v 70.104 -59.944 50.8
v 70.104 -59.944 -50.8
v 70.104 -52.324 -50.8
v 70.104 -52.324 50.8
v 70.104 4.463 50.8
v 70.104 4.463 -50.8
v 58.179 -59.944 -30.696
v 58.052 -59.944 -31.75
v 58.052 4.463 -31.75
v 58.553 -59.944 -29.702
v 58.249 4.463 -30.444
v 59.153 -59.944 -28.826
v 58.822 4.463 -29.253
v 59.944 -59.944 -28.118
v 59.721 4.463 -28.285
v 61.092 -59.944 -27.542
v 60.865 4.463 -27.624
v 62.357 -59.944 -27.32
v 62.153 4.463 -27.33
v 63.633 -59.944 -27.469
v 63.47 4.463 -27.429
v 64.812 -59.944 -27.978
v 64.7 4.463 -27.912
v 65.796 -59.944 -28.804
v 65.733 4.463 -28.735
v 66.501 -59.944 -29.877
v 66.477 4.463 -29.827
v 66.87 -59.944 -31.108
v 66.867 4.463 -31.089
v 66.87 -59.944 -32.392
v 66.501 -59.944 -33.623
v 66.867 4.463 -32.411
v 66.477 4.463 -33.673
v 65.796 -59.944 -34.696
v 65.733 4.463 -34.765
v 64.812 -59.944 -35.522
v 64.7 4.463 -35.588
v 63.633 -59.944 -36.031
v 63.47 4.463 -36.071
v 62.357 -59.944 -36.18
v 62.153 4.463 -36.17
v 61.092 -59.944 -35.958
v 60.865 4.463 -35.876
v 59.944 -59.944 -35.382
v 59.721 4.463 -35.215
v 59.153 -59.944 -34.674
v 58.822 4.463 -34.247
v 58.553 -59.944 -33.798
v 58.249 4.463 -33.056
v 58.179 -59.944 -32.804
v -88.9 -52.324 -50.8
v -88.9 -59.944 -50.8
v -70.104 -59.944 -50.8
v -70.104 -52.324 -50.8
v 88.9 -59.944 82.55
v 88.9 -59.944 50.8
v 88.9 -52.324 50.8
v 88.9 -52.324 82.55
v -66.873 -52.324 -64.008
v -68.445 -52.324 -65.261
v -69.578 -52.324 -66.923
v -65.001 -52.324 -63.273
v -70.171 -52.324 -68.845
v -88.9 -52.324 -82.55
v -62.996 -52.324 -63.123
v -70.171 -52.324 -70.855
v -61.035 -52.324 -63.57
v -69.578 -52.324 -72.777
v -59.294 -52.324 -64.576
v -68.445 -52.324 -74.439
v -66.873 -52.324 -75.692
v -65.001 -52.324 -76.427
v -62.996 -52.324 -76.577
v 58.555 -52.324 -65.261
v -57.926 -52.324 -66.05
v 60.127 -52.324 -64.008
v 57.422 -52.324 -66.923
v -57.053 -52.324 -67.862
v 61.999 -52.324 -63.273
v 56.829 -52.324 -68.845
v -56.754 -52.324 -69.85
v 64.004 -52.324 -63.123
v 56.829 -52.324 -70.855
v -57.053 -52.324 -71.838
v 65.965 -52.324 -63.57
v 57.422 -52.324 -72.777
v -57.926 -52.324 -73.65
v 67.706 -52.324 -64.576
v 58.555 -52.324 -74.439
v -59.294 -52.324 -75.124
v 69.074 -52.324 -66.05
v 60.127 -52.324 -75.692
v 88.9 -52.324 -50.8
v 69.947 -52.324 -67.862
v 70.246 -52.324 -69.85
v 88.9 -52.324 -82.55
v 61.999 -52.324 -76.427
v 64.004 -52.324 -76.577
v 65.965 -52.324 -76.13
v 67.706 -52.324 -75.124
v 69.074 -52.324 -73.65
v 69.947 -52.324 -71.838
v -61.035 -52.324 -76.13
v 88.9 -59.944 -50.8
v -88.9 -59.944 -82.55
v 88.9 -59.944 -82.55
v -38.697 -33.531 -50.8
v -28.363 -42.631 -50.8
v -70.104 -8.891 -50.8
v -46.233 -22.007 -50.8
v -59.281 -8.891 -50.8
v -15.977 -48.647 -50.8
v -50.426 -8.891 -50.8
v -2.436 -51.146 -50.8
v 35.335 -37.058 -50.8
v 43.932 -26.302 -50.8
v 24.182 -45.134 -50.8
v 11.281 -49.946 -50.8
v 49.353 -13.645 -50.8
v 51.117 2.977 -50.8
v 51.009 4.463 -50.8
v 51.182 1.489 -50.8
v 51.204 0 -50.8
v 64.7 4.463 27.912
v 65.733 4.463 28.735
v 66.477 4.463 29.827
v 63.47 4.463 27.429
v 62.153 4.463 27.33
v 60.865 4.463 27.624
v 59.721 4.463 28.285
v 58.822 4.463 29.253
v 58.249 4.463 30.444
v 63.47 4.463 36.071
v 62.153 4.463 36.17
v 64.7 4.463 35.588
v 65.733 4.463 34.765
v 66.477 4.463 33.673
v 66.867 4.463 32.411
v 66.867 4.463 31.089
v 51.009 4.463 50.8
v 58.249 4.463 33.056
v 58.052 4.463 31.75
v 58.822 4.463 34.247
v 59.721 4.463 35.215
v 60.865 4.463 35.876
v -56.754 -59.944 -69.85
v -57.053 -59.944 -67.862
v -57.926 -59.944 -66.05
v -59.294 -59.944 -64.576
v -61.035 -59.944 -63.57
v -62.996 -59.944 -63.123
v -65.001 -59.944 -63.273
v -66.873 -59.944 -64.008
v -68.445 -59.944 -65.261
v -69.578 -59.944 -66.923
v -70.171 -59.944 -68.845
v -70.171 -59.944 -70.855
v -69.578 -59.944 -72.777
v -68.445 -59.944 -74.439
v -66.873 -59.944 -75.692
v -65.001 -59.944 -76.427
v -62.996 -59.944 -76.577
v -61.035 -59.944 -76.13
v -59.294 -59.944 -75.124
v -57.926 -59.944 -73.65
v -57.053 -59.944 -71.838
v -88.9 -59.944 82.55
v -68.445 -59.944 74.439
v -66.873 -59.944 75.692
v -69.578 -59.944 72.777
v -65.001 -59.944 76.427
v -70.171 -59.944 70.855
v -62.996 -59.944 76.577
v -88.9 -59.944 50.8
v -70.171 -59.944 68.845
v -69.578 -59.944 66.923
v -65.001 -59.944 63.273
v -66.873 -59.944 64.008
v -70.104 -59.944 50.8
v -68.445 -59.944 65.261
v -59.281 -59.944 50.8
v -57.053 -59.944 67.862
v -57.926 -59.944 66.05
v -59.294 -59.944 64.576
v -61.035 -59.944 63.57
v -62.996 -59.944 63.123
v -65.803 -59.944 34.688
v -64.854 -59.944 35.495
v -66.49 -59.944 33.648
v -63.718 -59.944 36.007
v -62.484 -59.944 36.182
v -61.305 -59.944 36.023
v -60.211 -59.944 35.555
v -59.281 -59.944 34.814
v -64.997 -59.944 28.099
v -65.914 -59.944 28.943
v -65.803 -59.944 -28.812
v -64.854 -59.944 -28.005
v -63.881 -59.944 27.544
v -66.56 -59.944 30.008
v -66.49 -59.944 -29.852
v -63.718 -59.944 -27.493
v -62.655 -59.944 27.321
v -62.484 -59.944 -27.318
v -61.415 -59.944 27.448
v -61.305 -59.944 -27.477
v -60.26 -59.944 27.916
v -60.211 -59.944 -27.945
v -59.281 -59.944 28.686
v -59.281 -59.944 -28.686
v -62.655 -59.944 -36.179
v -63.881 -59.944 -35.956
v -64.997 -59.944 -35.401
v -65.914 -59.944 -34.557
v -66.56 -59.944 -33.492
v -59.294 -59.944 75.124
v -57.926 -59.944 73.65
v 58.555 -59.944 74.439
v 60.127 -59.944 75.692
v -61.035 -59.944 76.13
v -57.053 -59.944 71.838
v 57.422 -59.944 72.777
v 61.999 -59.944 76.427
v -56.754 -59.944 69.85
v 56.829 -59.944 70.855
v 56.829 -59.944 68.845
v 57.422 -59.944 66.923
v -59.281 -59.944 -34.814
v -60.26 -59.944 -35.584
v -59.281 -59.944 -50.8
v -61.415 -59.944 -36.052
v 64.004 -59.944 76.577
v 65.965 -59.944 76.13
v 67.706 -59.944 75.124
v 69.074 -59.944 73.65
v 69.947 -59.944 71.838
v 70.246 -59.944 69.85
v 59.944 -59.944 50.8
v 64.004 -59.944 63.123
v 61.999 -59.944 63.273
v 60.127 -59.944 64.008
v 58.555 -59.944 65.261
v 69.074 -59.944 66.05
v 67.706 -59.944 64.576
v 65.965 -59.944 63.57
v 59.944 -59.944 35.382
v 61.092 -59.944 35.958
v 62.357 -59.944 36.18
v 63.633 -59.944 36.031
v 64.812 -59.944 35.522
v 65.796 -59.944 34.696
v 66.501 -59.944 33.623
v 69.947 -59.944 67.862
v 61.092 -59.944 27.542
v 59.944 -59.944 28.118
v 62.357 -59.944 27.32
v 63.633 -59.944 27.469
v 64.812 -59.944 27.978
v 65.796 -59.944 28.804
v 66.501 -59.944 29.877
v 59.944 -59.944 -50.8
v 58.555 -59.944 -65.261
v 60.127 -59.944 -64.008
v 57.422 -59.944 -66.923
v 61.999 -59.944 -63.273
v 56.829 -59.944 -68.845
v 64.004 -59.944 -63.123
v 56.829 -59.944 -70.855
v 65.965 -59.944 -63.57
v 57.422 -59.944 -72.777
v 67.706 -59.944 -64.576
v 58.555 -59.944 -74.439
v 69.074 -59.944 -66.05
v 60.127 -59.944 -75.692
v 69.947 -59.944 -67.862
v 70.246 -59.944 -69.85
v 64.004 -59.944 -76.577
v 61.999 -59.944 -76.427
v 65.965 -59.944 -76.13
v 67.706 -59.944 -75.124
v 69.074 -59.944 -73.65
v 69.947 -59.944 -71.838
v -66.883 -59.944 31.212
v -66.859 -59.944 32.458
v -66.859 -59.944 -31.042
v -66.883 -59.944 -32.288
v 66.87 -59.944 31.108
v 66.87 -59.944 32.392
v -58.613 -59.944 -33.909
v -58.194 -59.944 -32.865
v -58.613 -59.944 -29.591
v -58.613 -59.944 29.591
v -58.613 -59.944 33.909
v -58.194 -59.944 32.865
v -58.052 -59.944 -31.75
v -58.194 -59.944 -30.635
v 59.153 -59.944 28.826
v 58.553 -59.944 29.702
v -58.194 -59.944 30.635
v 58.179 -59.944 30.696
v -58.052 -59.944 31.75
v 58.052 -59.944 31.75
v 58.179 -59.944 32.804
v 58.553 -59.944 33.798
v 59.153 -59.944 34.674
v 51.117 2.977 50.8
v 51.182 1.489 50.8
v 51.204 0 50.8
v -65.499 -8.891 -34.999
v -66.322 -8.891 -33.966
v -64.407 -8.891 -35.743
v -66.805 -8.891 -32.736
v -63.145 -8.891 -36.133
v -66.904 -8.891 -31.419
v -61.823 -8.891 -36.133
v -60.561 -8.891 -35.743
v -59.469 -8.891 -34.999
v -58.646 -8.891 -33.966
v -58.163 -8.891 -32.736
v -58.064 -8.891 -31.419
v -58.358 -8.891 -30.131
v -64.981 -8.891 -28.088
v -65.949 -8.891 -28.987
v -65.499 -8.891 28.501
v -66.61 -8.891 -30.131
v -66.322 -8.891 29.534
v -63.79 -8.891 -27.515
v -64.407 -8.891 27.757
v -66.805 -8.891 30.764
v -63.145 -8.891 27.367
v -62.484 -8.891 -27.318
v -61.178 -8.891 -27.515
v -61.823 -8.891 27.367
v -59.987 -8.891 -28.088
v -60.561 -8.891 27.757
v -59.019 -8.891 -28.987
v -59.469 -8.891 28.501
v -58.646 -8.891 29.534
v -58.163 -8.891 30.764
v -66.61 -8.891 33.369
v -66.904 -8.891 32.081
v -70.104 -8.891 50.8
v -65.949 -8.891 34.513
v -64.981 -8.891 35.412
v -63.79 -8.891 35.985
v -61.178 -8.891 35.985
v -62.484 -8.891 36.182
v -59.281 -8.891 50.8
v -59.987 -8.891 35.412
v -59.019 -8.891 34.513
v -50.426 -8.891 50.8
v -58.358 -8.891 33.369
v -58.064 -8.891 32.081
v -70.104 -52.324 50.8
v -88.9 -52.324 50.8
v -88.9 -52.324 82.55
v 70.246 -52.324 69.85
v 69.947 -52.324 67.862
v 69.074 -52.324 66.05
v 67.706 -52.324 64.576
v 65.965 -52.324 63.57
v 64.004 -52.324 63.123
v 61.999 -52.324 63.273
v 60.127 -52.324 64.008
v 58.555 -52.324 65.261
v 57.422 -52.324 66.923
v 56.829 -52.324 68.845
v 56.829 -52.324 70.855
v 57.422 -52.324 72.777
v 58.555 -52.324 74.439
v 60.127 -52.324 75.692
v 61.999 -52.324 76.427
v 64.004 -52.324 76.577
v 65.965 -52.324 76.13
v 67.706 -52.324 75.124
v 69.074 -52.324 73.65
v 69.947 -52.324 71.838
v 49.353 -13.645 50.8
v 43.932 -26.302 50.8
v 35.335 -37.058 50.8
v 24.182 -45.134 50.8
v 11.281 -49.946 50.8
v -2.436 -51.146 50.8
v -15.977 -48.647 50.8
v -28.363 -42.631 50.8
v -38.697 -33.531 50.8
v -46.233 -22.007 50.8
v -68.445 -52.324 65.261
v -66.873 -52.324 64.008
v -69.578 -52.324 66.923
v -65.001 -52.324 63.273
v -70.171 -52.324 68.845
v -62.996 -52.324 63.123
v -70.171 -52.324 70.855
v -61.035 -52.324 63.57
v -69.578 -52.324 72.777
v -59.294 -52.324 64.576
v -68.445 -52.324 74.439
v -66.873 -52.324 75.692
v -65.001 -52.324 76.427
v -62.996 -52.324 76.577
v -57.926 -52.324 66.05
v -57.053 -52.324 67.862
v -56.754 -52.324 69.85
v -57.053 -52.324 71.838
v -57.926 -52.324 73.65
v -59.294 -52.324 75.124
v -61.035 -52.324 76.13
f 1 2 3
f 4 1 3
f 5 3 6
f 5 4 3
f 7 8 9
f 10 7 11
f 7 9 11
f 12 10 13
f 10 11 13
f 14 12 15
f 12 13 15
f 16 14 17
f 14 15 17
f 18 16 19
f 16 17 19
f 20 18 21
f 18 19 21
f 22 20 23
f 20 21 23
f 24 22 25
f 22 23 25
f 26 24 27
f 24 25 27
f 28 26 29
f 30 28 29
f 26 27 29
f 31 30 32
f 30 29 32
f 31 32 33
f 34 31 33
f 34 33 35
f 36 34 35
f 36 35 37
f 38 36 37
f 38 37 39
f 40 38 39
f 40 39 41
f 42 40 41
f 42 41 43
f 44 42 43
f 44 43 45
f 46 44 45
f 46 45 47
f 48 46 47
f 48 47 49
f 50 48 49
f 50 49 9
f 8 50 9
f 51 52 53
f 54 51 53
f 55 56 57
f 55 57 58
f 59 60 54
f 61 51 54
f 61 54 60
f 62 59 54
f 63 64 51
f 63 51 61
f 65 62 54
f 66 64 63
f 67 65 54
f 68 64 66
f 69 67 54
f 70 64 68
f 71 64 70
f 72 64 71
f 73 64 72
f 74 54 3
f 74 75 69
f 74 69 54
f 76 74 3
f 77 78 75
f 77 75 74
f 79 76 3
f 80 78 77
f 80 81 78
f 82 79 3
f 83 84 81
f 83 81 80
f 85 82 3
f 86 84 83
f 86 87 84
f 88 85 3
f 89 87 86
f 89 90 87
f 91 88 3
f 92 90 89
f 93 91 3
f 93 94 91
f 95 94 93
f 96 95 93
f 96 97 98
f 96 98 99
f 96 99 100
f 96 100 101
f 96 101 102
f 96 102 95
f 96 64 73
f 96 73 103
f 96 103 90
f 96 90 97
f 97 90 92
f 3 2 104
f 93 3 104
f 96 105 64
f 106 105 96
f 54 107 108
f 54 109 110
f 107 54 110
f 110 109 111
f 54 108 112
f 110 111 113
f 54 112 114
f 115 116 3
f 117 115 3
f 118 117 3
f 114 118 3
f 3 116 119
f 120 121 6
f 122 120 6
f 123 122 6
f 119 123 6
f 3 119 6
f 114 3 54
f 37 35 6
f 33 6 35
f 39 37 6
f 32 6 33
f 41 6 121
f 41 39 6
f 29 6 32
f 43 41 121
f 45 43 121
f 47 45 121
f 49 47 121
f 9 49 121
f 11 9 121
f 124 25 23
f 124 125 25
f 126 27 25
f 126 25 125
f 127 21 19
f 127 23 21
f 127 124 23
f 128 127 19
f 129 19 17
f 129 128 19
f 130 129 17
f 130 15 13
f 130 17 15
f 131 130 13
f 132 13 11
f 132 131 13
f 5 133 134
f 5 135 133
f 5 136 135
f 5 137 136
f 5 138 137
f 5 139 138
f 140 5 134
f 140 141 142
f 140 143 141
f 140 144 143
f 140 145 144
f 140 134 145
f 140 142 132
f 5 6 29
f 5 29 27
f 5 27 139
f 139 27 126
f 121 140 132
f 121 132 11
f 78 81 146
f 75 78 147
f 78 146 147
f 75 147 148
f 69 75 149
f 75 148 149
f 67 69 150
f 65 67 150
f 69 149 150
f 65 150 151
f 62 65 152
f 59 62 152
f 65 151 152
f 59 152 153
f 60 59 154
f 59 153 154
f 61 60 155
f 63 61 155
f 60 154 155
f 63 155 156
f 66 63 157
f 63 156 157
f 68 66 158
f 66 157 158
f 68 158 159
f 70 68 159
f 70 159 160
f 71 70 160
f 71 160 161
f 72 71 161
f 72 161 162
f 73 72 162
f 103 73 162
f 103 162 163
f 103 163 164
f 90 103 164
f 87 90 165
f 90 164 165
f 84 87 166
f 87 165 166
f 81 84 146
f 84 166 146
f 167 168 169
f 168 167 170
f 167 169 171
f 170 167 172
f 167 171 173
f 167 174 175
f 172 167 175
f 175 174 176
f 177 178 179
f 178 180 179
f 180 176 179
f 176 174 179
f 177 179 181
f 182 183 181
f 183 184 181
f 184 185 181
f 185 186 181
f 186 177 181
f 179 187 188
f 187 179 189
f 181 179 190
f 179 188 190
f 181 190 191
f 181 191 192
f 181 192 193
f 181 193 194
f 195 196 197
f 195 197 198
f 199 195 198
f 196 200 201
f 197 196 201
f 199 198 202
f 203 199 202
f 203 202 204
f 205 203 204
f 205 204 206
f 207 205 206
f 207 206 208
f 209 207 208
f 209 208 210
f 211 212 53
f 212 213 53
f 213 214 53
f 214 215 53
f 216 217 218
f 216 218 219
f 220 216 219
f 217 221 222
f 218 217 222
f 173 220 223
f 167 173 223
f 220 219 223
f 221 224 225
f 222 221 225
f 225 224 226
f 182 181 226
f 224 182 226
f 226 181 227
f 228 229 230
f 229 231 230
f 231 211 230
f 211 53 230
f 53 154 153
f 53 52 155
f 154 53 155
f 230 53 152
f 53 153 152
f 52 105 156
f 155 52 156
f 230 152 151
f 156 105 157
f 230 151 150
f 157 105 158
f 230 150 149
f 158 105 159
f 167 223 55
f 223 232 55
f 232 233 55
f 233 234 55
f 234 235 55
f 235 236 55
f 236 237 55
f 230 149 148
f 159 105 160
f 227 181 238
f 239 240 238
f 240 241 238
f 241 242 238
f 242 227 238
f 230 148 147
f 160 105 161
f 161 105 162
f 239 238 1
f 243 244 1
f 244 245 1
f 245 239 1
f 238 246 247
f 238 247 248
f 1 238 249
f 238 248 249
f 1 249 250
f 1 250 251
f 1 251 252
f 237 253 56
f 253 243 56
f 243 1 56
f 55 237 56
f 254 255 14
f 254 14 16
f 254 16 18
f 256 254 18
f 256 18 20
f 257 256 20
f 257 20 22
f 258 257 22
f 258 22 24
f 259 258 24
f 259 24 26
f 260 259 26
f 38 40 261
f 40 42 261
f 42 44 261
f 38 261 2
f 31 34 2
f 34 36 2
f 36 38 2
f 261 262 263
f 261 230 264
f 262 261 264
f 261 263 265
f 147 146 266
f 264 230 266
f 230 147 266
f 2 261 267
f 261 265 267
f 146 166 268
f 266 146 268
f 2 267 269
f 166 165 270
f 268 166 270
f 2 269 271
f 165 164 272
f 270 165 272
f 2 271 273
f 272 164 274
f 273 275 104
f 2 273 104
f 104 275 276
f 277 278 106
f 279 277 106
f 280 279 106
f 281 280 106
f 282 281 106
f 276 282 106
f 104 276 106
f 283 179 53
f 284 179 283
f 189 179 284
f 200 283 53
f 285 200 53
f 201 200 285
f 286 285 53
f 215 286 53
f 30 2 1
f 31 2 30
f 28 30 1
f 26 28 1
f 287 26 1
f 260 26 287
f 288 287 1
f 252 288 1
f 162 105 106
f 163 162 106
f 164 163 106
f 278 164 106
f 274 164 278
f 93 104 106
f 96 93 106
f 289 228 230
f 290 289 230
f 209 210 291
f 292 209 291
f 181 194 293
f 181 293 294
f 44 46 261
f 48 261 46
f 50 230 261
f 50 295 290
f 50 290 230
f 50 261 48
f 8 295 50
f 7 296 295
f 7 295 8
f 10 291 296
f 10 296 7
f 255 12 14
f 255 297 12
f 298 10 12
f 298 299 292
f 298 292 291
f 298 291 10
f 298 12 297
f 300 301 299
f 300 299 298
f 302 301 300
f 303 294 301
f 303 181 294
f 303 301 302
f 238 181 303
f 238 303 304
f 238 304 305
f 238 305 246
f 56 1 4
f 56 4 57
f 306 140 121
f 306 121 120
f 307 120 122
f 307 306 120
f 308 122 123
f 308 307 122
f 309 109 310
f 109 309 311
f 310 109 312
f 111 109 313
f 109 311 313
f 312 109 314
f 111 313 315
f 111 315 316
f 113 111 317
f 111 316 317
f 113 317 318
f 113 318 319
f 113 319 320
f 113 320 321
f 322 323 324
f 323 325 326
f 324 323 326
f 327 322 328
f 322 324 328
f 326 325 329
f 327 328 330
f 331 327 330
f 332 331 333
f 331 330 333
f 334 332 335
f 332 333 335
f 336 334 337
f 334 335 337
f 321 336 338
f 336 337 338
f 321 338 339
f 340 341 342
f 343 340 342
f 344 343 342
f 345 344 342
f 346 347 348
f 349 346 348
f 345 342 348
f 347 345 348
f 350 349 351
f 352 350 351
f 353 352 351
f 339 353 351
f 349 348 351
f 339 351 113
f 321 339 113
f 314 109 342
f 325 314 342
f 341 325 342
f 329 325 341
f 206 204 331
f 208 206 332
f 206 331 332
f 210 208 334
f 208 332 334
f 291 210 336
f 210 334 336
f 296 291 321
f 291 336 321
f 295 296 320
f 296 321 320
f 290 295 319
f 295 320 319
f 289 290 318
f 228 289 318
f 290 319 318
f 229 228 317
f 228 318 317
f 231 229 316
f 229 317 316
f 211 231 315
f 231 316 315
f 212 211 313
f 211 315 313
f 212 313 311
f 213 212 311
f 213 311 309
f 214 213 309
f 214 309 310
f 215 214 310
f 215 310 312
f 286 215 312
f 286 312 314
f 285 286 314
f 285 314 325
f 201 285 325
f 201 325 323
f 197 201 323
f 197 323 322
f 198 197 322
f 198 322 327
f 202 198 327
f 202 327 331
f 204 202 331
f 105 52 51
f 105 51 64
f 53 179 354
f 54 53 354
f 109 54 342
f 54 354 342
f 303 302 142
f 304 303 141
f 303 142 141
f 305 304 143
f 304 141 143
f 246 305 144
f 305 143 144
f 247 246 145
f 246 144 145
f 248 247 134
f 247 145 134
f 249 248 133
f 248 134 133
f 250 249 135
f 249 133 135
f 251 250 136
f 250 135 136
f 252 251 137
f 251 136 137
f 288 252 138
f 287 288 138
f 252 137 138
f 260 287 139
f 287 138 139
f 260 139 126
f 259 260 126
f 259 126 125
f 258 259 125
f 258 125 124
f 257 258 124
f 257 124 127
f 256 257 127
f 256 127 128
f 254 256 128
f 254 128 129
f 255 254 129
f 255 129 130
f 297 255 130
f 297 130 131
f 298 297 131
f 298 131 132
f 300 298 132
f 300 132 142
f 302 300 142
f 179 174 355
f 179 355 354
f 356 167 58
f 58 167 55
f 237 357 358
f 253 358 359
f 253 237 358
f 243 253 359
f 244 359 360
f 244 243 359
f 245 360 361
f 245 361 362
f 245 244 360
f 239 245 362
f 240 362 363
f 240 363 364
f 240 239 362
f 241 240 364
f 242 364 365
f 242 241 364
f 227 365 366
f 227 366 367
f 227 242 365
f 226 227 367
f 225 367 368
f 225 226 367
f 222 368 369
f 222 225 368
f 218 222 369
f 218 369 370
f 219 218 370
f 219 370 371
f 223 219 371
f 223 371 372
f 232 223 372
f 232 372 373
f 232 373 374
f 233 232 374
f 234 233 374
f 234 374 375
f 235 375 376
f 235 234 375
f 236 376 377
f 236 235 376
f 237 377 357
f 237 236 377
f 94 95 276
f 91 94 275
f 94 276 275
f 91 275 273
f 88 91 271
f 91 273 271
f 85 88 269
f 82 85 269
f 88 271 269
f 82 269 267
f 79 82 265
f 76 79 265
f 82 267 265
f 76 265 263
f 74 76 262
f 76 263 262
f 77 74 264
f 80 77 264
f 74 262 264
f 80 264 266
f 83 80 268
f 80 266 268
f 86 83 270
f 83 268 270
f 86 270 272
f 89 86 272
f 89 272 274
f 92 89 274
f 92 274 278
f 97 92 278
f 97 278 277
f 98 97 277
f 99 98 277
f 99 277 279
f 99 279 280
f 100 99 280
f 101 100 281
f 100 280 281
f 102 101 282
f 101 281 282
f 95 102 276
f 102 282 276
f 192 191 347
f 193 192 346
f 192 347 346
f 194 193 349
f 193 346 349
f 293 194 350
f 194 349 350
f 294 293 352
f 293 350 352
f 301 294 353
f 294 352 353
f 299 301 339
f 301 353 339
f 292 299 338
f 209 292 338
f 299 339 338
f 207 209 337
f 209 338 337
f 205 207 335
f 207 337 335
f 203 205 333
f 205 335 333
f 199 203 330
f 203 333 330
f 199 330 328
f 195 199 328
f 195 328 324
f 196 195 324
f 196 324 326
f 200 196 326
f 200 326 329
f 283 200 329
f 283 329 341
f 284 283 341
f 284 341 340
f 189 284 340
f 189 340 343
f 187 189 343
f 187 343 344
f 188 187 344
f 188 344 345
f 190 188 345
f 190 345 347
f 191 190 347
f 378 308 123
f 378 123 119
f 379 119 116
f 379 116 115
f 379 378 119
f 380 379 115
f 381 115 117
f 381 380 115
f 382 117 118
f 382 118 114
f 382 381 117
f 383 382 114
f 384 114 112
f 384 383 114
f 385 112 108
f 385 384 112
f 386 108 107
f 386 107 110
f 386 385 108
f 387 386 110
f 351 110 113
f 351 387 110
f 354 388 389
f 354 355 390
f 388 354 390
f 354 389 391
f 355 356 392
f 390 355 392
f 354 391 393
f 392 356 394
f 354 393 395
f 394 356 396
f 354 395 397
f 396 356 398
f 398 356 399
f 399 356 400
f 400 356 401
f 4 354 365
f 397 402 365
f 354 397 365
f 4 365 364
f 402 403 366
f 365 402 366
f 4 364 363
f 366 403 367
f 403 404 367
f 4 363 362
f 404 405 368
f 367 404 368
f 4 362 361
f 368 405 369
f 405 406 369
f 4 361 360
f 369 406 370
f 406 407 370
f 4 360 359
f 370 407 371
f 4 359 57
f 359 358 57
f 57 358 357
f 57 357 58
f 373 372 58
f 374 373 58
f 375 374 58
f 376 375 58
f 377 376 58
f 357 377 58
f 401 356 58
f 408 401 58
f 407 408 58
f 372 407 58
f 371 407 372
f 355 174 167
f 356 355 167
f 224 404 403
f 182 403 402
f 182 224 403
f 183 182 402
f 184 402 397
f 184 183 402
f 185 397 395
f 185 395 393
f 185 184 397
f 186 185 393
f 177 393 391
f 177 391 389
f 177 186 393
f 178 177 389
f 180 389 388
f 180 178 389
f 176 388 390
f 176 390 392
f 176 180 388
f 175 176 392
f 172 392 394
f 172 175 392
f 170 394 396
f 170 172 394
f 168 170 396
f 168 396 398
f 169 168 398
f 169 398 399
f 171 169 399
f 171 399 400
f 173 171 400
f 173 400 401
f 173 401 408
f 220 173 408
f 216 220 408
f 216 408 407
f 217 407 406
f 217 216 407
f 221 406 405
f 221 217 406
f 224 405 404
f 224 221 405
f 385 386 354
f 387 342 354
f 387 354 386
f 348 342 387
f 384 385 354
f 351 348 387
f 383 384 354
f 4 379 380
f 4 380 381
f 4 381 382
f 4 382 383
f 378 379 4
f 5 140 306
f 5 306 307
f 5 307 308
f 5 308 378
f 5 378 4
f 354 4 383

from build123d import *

# Parameters (mm, degrees)
SKETCH1_W                       = 10.823103443
SKETCH1_H                       = 51.052518719
BOSS_EXTRUDE1_DEPTH             = 50.8
SKETCH2_W                       = 177.8
SKETCH2_H                       = 31.75
BOSS_EXTRUDE2_DEPTH             = 7.62
F_1_2_START                     = -59.944
F_1_2_CLEARANCE_HOLE1_OUTLINE_R = 6.74624
F_1_2_CLEARANCE_HOLE1_DEPTH     = 7.62
SKETCH8_R                       = 4.4323
CUT_EXTRUDE2_DEPTH              = 138.353334223
SKETCH9_R                       = 4.4323
CUT_EXTRUDE3_DEPTH              = 132.62094122


# Read off the part's stored shape, not the designer's step: 1/2 Clearance Hole1
with BuildPart() as part:
    # Sketch1 → Boss-Extrude1 (new, symmetric)
    with BuildSketch(Plane.XY):
        with Locations((-64.692448278, -34.41774064)):
            Rectangle(SKETCH1_W, SKETCH1_H)
        with BuildLine():
            ThreePointArc((-2e-09, -59.944), (-39.117081832, -45.421768404), (-59.280896557, -8.891481281))
            Line((-59.280896557, -8.891481281), (-59.280896557, -59.944))
            Line((-59.280896557, -59.944), (-2e-09, -59.944))
        make_face()
        with BuildLine():
            Line((-50.42609614, -8.891481281), (-59.280896557, -8.891481281))
            ThreePointArc((-59.280896557, -8.891481281), (-39.117081832, -45.421768404), (-2e-09, -59.944))
            ThreePointArc((-2e-09, -59.944), (42.386808891, -42.386808892), (59.944, 0))
            ThreePointArc((59.944, 0), (59.902397652, 2.232911009), (59.777648353, 4.462722648))
            Line((59.777648353, 4.462722648), (51.009153275, 4.462722648))
            ThreePointArc((51.009153275, 4.462722648), (51.155265092, 2.233487109), (51.203999954, 0))
            ThreePointArc((51.203999954, 0), (4.462722648, -51.009153275), (-50.42609614, -8.891481281))
        make_face()
        with BuildLine():
            ThreePointArc((59.944, 0), (42.386808891, -42.386808892), (-2e-09, -59.944))
            Line((-2e-09, -59.944), (59.944, -59.944))
            Line((59.944, -59.944), (59.944, 0))
        make_face()
        with BuildLine():
            Line((70.104, 4.462722648), (59.777648353, 4.462722648))
            ThreePointArc((59.777648353, 4.462722648), (59.902397652, 2.232911009), (59.944, 0))
            Line((59.944, 0), (59.944, -59.944))
            Line((59.944, -59.944), (70.104, -59.944))
            Line((70.104, -59.944), (70.104, 4.462722648))
        make_face()
    extrude(amount=BOSS_EXTRUDE1_DEPTH, both=True)

    # Sketch2 → Boss-Extrude2 (add)
    with BuildSketch(Plane.XZ.offset(59.944)):
        with Locations((0, 66.675)):
            Rectangle(SKETCH2_W, SKETCH2_H)
    boss_extrude2 = extrude(amount=-BOSS_EXTRUDE2_DEPTH)

    # 1/2 Clearance Hole1 outline → 1/2 Clearance Hole1 (cut)
    with BuildSketch(Plane(origin=(0, 0, 0), x_dir=(1, 0, 0), z_dir=(0, 1, 0)).offset(F_1_2_START)):
        with Locations((63.5, -69.85)):
            Circle(F_1_2_CLEARANCE_HOLE1_OUTLINE_R)
        with Locations((-63.5, -69.85)):
            Circle(F_1_2_CLEARANCE_HOLE1_OUTLINE_R)
    f_1_2_clearance_hole1 = extrude(amount=F_1_2_CLEARANCE_HOLE1_DEPTH, mode=Mode.SUBTRACT)

    # Mirror1: Boss-Extrude2, 1/2 Clearance Hole1 across plane
    add(boss_extrude2.mirror(Plane.XY))
    add(f_1_2_clearance_hole1.mirror(Plane.XY), mode=Mode.SUBTRACT)

    # Sketch8 → Cut-Extrude2 (cut, through all)
    with BuildSketch(Plane(origin=(0, 4.462722648, 0), x_dir=(1, 0, 0), z_dir=(0, 1, 0))):
        with Locations(Location((62.484, 31.75, 0), (0, 0, 180))):
            Circle(SKETCH8_R)
        with Locations(Location((62.484, -31.75, 0), (0, 0, 180))):
            Circle(SKETCH8_R)
    extrude(amount=-CUT_EXTRUDE2_DEPTH, mode=Mode.SUBTRACT)

    # Sketch9 → Cut-Extrude3 (cut, through all)
    with BuildSketch(Plane(origin=(0, -8.891481281, 0), x_dir=(1, 0, 0), z_dir=(0, 1, 0))):
        with Locations(Location((-62.484, 31.75, 0), (0, 0, 270))):
            Circle(SKETCH9_R)
        with Locations(Location((-62.484, -31.75, 0), (0, 0, 270))):
            Circle(SKETCH9_R)
    extrude(amount=-CUT_EXTRUDE3_DEPTH, mode=Mode.SUBTRACT)


solid = part.part
